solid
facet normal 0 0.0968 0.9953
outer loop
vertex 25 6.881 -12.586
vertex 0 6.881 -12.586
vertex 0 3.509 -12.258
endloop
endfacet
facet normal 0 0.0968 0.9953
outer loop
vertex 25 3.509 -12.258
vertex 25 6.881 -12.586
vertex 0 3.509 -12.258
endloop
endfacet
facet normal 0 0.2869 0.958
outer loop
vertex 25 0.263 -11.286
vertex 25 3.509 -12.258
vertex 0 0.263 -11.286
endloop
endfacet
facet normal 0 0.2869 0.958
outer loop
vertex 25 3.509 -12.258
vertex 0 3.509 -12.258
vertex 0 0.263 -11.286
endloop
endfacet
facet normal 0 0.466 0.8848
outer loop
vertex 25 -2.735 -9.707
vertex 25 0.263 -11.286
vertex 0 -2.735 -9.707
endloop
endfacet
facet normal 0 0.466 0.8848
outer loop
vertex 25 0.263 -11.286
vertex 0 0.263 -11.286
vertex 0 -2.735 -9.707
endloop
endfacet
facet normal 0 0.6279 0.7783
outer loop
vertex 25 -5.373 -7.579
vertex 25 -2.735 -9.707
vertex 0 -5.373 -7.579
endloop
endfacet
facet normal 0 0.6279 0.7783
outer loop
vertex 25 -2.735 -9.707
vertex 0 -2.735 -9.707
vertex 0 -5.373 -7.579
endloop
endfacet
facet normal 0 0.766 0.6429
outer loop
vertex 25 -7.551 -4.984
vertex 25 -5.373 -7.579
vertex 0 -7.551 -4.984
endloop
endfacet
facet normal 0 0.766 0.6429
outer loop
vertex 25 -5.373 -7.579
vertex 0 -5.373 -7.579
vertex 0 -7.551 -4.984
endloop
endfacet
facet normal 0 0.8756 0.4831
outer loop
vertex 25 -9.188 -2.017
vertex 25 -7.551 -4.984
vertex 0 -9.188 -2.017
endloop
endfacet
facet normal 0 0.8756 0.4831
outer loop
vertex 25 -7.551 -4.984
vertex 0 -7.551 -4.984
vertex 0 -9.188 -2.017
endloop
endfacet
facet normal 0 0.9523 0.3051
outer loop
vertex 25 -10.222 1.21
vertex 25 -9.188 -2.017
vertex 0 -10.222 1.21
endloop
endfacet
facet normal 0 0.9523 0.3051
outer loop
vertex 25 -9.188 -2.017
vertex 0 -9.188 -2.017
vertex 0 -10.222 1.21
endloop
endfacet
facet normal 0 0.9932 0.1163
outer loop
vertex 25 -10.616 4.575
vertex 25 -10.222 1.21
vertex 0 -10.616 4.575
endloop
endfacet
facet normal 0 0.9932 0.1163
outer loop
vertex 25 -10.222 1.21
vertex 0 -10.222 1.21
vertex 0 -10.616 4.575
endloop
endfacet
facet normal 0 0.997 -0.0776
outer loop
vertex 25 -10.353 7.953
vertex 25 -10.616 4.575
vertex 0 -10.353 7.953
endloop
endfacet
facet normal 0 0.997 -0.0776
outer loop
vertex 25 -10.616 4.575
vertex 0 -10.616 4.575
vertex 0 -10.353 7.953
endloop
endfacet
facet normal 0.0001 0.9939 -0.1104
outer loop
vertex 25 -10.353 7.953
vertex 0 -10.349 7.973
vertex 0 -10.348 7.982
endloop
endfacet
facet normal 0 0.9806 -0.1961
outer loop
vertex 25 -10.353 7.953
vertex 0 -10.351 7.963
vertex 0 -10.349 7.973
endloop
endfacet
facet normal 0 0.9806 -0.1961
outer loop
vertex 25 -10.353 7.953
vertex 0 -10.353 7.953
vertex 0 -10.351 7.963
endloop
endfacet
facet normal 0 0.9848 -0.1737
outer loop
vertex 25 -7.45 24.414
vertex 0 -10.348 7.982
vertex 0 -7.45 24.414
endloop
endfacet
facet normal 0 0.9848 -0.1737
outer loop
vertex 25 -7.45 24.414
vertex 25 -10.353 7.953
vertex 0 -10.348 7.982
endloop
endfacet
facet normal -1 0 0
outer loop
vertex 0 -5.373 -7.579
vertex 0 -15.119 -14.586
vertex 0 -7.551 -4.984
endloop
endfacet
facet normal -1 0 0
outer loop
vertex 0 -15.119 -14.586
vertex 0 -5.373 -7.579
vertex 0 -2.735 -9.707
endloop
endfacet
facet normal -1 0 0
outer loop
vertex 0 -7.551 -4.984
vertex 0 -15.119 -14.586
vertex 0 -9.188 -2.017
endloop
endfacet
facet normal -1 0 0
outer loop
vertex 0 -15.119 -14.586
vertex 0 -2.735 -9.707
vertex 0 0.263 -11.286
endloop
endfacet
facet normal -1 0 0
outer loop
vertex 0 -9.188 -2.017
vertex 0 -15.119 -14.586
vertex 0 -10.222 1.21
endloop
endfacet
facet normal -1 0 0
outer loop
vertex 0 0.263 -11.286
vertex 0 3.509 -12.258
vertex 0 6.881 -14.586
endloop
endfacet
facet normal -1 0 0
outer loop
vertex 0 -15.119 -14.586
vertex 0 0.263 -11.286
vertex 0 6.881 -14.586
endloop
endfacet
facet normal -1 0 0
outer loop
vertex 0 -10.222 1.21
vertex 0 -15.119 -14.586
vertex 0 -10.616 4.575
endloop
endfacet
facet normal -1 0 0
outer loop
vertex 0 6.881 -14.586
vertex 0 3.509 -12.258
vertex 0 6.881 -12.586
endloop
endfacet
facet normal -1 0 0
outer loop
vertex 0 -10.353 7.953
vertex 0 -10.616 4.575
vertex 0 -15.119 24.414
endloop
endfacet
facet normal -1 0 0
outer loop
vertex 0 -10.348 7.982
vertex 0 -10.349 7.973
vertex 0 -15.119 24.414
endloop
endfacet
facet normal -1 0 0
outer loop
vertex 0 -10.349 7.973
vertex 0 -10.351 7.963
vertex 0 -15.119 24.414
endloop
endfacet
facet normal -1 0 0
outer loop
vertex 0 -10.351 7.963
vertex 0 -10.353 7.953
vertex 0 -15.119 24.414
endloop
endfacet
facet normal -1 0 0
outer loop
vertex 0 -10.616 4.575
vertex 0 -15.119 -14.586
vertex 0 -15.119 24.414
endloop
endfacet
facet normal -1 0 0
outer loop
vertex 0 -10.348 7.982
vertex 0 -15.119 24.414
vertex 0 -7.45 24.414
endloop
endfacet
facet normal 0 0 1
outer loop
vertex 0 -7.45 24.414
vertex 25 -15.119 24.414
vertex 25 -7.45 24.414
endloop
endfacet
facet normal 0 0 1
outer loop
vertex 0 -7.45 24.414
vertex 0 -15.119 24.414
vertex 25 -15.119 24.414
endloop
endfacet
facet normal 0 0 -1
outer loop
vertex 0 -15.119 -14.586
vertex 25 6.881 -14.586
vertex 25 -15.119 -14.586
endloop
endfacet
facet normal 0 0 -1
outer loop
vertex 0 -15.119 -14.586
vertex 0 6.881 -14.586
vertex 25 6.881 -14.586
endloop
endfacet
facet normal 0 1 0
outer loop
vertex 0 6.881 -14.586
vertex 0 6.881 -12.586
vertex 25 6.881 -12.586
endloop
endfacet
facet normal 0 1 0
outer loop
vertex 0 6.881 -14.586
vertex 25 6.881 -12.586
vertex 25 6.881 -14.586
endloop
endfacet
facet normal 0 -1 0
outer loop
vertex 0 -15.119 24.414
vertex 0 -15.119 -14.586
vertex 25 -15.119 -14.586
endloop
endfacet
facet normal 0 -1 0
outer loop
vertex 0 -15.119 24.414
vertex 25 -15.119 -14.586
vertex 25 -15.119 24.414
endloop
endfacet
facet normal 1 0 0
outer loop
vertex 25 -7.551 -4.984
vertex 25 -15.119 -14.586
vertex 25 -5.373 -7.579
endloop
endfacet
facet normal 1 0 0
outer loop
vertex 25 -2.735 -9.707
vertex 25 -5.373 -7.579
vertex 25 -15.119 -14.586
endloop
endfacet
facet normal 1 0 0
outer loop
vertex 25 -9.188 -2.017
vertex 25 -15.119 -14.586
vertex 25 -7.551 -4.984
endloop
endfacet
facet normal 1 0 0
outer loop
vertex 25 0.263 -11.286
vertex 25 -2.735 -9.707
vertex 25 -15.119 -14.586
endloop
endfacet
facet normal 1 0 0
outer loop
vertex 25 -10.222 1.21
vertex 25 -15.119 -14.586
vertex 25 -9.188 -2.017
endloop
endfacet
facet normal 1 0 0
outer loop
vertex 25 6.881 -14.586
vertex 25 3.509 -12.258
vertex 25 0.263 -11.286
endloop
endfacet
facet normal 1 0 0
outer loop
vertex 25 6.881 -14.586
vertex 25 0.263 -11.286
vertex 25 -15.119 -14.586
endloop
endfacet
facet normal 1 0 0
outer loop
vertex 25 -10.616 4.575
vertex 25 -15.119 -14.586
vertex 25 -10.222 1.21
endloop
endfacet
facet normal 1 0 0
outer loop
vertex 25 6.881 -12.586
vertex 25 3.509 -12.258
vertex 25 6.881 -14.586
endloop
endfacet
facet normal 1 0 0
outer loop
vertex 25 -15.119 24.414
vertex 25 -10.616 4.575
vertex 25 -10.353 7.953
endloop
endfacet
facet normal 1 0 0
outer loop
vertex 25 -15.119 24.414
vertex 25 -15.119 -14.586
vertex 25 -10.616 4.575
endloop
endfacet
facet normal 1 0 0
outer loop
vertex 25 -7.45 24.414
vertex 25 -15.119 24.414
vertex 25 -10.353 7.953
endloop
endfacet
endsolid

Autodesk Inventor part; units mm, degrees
ref_plane "YZ Plane" through (0, 0, 0) normal (1, 0, 0) x (0, 1, 0)
ref_plane "XZ Plane" through (0, 0, 0) normal (0, 1, 0) x (-1, 0, 0)
ref_plane "XY Plane" through (0, 0, 0) normal (0, 0, 1) x (1, 0, 0)
sketch "Sketch1" plane through (0, 0, 0) normal (1, 0, 0) x (0, 1, 0)
  point P0 (0, 0)
sketch "Sketch2" plane through (0, 0, 0) normal (1, 0, 0) x (0, 1, 0)
  line L0 (-15.1188, 24.4143) -> (6.8812, 24.4143)
  line L1 (6.8812, 24.4143) -> (6.8812, -14.5857)
  line L2 (6.8812, -14.5857) -> (-15.1188, -14.5857)
  line L3 (-15.1188, -14.5857) -> (-15.1188, 24.4143)
  circle A0 centre (6.8812, 4.9143) radius 17.5
  point P0 (0, 0)
  point P1 (6.8812, -12.5857)
  point P2 (6.8812, 22.4143)
  dimension "d0" = 39
  dimension "d1" = 22
  dimension "d2" = 35
  dimension "d5" = 19.5
  dimension "d6" = 19.5
extrude "Extrusion1" add sketch "Sketch2" along normal blind 25 contours L0 L1 A0 L2 L3
sketch "Sketch3" plane through (25, 0, 0) normal (1, 0, 0) x (0, 0, -1)
  arc A0 (-22.4143, 6.8812) -> (12.5857, 6.8812) centre (-4.9143, 6.8812) ccw projected
  line L0 (-4.9143, 6.8812) -> (-7.9532, -10.3529)
  line L1 (-4.9143, 6.8812) -> (12.5857, 6.8812) construction
  line L2 (-7.9532, -10.3529) -> (-24.4143, -7.4504)
  line L3 (-24.4143, 6.8812) -> (-24.4143, -15.1188) projected
  line L4 (-24.4143, -7.4504) -> (-33.9046, 19.8743)
  line L5 (-33.9046, 19.8743) -> (-4.9143, 6.8812)
  point P0 (0, 0)
  dimension "d7" = 100
extrude "Extrusion2" cut sketch "Sketch3" against normal blind 37.625
properties part number "BaseArmHolder"
